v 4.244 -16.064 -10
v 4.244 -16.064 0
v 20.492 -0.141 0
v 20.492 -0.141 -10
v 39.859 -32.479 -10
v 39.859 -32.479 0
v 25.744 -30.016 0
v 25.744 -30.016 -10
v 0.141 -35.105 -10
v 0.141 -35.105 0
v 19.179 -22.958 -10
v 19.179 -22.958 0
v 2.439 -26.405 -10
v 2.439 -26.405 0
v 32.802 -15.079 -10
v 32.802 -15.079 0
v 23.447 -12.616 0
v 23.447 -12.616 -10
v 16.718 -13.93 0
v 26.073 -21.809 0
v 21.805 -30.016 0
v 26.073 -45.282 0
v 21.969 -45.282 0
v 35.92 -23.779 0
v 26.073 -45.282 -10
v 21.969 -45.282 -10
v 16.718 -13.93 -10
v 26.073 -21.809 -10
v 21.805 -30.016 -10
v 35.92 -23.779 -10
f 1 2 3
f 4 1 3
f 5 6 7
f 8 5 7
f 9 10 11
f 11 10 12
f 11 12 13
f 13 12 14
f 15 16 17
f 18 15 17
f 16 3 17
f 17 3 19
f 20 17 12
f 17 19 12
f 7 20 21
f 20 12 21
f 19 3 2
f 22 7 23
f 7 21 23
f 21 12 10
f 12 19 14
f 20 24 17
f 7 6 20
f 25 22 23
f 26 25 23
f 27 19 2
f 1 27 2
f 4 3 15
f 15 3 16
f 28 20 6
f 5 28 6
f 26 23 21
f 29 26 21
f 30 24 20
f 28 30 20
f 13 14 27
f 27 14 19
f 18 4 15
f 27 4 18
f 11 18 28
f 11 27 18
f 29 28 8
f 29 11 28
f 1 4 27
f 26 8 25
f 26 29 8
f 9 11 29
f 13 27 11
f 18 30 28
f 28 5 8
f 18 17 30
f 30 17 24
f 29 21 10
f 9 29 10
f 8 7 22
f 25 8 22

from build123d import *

# Parameters (mm, degrees)
EXTRUDE_DEPTH = 10


with BuildPart() as part:
    # path4181 → Extrude (new body)
    with BuildSketch(Plane(origin=(19.999989, -22.71163, 0), x_dir=(0, -1, 0), z_dir=(0, 0, -1))):
        with BuildLine():
            add(Edge.make_bspline(
                [(22.570525, -1.969483), (7.304641, -1.805358)],
                knots=[0, 0, 54.094838, 54.094838], degree=1))
            add(Edge.make_bspline(
                [(7.304641, -1.805358), (12.393269, 19.85894)],
                knots=[0, 0, 78.852395, 78.852395], degree=1))
            add(Edge.make_bspline(
                [(12.393269, 19.85894), (0.246224, 0.820617)],
                knots=[0, 0, 80.019804, 80.019804], degree=1))
            add(Edge.make_bspline(
                [(0.246224, 0.820617), (3.693359, 17.561211)],
                knots=[0, 0, 60.561559, 60.561559], degree=1))
            add(Edge.make_bspline(
                [(3.693359, 17.561211), (-8.781986, 3.28247)],
                knots=[0, 0, 67.184379, 67.184379], degree=1))
            add(Edge.make_bspline(
                [(-8.781986, 3.28247), (-6.648045, 15.755852)],
                knots=[0, 0, 44.839145, 44.839145], degree=1))
            add(Edge.make_bspline(
                [(-6.648045, 15.755852), (-22.570525, -0.492372)],
                knots=[0, 0, 80.607717, 80.607717], degree=1))
            add(Edge.make_bspline(
                [(-22.570525, -0.492372), (-7.632941, -12.80163)],
                knots=[0, 0, 68.58375, 68.58375], degree=1))
            add(Edge.make_bspline(
                [(-7.632941, -12.80163), (-10.09518, -3.446593)],
                knots=[0, 0, 34.276682, 34.276682], degree=1))
            add(Edge.make_bspline(
                [(-10.09518, -3.446593), (1.066971, -15.919976)],
                knots=[0, 0, 59.309806, 59.309806], degree=1))
            add(Edge.make_bspline(
                [(1.066971, -15.919976), (-0.902821, -6.072568)],
                knots=[0, 0, 35.583612, 35.583612], degree=1))
            add(Edge.make_bspline(
                [(-0.902821, -6.072568), (9.766881, -19.85894)],
                knots=[0, 0, 61.770178, 61.770178], degree=1))
            add(Edge.make_bspline(
                [(9.766881, -19.85894), (7.304641, -5.744322)],
                knots=[0, 0, 50.7677, 50.7677], degree=1))
            add(Edge.make_bspline(
                [(7.304641, -5.744322), (22.570525, -6.072568)],
                knots=[0, 0, 54.104215, 54.104215], degree=1))
            add(Edge.make_bspline(
                [(22.570525, -6.072568), (22.570525, -1.969483)],
                knots=[0, 0, 14.538494, 14.538494], degree=1))
        make_face()
    extrude(amount=EXTRUDE_DEPTH)


solid = part.part
